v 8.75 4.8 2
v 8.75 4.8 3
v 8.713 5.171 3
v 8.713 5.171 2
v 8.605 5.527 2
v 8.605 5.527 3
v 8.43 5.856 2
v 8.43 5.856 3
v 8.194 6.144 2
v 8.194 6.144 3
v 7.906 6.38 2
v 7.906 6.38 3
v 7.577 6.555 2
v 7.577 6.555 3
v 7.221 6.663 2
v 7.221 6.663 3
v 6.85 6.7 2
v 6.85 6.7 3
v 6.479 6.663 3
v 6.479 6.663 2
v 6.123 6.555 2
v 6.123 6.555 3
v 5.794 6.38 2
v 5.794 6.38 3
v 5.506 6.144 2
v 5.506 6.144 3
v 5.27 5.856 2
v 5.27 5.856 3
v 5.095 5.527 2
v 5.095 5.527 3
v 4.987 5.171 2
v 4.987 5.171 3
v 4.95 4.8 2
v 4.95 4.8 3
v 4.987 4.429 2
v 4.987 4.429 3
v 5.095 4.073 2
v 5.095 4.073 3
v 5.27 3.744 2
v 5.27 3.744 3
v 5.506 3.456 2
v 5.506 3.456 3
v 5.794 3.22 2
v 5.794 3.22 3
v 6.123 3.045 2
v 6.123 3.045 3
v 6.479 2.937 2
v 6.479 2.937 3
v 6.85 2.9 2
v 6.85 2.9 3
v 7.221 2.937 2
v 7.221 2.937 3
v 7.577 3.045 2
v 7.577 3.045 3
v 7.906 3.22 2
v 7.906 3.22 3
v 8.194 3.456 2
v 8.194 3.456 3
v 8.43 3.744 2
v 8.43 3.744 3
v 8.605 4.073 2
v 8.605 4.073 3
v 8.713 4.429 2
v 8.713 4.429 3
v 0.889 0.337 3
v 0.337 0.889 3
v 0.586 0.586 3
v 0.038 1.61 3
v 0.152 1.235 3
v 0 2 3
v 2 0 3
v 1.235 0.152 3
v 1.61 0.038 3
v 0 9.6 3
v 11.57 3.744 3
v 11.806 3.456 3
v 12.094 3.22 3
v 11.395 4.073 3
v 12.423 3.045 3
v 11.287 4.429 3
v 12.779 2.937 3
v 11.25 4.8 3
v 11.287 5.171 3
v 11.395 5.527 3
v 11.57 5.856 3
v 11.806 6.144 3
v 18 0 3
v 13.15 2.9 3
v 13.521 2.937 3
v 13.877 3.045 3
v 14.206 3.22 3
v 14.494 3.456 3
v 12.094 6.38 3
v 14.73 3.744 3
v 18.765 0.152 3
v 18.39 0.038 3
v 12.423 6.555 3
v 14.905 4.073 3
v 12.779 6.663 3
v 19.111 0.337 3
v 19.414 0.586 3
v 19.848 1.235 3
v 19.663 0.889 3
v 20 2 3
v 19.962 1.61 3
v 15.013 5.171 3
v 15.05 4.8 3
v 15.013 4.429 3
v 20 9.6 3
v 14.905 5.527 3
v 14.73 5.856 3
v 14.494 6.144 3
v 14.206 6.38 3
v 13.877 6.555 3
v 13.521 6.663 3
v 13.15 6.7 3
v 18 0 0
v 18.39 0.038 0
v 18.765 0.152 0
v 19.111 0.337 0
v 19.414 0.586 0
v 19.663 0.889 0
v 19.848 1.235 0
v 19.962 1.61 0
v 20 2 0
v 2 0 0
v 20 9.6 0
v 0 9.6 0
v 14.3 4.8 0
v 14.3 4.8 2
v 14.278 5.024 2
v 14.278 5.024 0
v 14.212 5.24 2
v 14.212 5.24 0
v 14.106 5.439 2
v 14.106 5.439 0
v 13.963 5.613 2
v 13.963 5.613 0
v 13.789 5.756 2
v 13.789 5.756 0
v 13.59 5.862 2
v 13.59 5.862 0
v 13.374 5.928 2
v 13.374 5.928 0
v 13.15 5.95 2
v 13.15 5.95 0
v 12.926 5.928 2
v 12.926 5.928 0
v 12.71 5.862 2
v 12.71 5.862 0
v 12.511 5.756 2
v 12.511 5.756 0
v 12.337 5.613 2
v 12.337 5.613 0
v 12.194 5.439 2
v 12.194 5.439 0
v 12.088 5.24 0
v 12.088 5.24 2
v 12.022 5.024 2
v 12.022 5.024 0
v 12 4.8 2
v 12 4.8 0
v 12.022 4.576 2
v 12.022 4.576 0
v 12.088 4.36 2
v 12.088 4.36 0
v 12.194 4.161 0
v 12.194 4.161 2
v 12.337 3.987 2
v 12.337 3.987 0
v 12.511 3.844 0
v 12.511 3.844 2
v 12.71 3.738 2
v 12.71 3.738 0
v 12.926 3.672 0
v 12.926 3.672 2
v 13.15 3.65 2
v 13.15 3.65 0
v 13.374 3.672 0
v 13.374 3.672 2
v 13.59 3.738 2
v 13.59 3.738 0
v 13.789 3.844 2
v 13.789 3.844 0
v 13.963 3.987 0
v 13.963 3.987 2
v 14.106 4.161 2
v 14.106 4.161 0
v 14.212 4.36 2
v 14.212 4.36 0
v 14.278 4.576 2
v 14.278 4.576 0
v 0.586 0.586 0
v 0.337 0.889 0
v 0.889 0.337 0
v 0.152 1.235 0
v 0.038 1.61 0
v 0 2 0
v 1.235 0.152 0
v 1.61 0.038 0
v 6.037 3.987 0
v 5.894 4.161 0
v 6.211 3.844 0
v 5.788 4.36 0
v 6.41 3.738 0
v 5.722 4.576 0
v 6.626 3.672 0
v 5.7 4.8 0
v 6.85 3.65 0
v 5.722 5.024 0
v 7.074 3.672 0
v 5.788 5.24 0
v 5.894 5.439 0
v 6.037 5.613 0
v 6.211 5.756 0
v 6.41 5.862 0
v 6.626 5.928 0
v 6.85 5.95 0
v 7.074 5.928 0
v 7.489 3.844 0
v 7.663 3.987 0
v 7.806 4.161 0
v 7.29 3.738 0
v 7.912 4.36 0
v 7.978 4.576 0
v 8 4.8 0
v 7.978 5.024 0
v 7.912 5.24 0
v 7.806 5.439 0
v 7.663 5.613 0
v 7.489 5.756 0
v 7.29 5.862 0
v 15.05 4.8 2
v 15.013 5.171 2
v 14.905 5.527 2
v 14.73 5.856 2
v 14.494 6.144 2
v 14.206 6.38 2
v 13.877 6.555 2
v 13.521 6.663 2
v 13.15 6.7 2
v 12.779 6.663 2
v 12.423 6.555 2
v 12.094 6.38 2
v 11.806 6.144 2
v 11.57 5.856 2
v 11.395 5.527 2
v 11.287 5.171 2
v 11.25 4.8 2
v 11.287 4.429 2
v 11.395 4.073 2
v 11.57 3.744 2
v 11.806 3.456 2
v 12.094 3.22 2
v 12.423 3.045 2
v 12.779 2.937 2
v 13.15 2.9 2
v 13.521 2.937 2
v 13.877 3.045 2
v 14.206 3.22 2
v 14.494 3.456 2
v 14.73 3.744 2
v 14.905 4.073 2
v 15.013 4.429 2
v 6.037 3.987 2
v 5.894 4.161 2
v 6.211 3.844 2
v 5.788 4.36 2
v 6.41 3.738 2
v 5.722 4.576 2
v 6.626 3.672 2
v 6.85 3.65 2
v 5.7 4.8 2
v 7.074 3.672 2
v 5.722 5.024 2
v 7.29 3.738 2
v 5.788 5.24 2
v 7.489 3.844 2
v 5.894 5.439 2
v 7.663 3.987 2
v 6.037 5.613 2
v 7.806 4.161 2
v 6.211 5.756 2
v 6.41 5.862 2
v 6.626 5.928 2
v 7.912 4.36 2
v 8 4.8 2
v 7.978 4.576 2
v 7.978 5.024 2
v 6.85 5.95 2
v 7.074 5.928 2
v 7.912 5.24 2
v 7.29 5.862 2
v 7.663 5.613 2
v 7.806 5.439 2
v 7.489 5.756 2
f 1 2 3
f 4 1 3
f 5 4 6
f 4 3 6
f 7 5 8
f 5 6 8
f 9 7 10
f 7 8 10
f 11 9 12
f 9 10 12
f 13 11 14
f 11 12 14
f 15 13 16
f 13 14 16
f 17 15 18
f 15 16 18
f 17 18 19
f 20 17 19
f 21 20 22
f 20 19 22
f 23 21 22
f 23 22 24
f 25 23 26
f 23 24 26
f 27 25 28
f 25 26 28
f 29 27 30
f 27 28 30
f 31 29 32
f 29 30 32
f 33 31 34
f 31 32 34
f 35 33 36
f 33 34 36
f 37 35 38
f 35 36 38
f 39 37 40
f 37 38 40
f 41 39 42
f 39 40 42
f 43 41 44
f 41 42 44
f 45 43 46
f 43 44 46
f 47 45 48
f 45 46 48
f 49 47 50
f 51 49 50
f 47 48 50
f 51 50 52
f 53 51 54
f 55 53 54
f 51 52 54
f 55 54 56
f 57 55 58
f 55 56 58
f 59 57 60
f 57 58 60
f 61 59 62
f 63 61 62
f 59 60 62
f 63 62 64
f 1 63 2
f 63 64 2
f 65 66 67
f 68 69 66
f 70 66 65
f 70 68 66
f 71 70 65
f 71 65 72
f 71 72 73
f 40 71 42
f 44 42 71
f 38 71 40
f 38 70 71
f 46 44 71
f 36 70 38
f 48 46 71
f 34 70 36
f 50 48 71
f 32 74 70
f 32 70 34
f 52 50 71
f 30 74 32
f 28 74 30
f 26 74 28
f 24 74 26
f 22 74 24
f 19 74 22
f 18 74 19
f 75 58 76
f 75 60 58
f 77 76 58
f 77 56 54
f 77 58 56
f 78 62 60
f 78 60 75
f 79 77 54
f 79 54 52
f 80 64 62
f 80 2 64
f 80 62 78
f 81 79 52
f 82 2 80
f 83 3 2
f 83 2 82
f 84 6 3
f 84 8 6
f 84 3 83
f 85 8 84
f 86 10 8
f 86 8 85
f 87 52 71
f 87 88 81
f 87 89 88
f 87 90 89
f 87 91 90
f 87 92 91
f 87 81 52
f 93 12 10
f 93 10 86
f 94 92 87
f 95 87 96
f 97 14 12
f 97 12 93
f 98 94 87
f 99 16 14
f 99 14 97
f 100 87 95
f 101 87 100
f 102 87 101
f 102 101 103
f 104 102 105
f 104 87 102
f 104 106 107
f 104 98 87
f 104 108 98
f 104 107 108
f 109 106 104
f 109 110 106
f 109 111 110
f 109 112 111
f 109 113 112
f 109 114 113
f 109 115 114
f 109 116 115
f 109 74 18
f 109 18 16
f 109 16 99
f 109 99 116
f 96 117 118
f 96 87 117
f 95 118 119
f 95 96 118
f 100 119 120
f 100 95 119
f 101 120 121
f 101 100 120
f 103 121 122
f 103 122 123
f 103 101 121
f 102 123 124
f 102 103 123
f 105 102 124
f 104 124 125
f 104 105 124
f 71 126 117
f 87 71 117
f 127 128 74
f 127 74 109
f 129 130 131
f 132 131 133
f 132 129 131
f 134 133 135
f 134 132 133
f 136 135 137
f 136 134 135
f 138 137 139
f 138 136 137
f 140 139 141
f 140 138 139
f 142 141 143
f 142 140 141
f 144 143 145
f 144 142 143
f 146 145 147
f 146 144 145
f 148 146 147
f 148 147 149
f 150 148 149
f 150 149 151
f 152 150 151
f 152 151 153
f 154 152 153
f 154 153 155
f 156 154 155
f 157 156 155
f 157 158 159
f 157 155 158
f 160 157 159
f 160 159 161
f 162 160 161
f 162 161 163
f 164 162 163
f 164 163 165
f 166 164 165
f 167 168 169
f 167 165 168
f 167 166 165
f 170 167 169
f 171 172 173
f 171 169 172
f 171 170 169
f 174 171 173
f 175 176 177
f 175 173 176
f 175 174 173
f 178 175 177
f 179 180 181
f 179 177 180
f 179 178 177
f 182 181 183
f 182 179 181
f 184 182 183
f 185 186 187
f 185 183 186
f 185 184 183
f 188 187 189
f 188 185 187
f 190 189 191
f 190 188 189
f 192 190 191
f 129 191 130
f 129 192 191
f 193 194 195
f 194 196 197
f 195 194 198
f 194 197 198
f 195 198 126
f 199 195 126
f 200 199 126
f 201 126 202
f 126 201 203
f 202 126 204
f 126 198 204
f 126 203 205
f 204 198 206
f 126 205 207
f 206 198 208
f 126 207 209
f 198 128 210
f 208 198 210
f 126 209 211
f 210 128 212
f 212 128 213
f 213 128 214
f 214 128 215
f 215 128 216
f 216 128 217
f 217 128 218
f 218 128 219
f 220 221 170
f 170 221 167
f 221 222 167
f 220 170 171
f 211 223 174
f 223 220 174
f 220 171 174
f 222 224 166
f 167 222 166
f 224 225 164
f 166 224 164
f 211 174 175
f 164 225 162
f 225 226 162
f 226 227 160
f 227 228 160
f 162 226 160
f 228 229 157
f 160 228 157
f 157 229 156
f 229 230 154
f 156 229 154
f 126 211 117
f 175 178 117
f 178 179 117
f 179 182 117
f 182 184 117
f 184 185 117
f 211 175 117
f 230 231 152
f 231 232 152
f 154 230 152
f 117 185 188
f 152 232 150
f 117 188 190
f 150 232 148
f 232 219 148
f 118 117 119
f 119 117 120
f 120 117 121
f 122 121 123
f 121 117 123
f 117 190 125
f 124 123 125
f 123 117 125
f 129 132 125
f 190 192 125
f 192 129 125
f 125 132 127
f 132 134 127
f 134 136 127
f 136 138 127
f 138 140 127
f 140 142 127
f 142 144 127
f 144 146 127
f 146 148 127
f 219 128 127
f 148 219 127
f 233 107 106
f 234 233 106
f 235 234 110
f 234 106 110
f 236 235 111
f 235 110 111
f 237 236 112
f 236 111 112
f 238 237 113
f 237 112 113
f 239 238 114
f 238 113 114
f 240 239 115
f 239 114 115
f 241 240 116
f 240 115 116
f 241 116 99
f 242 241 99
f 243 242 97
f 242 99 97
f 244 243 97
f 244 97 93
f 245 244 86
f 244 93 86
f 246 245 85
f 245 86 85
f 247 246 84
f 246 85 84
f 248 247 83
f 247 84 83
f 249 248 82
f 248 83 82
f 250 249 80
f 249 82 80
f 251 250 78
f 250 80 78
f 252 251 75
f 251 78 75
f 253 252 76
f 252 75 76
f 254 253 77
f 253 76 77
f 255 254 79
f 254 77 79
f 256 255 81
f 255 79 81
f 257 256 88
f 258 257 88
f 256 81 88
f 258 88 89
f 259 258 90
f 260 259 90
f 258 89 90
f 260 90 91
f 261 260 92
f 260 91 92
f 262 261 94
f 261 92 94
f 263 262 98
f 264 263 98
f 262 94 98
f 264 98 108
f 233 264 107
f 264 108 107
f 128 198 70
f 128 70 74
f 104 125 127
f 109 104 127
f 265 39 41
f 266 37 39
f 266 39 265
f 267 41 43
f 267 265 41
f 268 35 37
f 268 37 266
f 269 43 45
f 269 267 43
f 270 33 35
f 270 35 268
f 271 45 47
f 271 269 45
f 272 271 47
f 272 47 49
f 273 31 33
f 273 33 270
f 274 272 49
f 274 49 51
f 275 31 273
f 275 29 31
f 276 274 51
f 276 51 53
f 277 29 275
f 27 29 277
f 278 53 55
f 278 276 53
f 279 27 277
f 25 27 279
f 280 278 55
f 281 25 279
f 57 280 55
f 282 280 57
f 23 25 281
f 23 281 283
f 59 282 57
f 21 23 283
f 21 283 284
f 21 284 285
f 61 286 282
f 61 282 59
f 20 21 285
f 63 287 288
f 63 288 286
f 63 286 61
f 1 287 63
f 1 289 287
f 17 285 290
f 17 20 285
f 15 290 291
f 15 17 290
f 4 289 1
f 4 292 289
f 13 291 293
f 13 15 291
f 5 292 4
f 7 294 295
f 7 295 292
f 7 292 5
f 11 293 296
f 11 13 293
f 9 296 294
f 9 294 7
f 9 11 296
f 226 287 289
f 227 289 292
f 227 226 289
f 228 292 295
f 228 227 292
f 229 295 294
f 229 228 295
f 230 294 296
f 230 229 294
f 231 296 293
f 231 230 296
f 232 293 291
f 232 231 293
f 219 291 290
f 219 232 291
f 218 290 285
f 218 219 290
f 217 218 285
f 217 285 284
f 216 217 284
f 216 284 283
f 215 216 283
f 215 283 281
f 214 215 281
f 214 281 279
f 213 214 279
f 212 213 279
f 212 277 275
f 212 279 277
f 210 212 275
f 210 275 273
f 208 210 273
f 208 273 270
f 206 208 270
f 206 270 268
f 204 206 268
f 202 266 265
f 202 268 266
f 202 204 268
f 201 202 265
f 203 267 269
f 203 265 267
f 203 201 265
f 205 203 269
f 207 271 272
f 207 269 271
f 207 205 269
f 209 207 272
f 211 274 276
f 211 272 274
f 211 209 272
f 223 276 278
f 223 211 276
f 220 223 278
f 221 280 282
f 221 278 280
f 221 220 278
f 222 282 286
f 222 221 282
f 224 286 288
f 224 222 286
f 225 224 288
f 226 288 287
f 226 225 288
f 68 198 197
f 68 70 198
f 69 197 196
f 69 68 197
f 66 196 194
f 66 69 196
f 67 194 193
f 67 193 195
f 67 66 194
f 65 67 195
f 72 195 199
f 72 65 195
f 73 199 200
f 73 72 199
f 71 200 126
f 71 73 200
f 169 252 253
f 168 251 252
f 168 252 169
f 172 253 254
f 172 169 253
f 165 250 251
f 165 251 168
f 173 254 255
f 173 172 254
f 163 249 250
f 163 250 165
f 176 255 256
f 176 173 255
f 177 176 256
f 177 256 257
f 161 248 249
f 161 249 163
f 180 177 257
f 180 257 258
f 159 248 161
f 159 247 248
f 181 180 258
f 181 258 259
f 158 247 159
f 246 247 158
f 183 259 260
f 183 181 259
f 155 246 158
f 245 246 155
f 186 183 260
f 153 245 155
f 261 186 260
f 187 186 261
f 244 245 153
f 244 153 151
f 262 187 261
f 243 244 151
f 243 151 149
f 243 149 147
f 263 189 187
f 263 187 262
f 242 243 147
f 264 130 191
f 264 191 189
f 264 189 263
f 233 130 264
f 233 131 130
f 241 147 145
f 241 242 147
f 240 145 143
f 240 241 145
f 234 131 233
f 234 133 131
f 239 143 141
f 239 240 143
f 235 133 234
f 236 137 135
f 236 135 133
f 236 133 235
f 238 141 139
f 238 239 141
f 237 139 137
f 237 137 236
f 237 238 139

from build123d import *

# Parameters (mm, degrees)
SKETCH1_W           = 20
SKETCH1_H           = 9.6
SKETCH1_R           = 1.15
BOSS_EXTRUDE1_DEPTH = 3
FILLET1_R           = 2
SKETCH2_R           = 1.9
CUT_EXTRUDE1_DEPTH  = 1


with BuildPart() as part:
    # Sketch1 → Boss-Extrude1 (new body)
    with BuildSketch(Plane.XY):
        with Locations((10, 4.8)):
            Rectangle(SKETCH1_W, SKETCH1_H)
        with Locations((6.85, 4.8)):
            Circle(SKETCH1_R, mode=Mode.SUBTRACT)
        with Locations((13.15, 4.8)):
            Circle(SKETCH1_R, mode=Mode.SUBTRACT)
    extrude(amount=BOSS_EXTRUDE1_DEPTH)

    # Fillet1
    fillet1_edges = [part.edges().sort_by_distance(p)[0] for p in [
        (20, 0, 1.5),
        (0, 0, 1.5),
    ]]
    fillet(fillet1_edges, radius=FILLET1_R)

    # Sketch2 → Cut-Extrude1 (cut)
    with BuildSketch(Plane.XY.offset(3)):
        with Locations((6.85, 4.8)):
            Circle(SKETCH2_R)
        with Locations((13.15, 4.8)):
            Circle(SKETCH2_R)
    extrude(amount=-CUT_EXTRUDE1_DEPTH, mode=Mode.SUBTRACT)


solid = part.part
